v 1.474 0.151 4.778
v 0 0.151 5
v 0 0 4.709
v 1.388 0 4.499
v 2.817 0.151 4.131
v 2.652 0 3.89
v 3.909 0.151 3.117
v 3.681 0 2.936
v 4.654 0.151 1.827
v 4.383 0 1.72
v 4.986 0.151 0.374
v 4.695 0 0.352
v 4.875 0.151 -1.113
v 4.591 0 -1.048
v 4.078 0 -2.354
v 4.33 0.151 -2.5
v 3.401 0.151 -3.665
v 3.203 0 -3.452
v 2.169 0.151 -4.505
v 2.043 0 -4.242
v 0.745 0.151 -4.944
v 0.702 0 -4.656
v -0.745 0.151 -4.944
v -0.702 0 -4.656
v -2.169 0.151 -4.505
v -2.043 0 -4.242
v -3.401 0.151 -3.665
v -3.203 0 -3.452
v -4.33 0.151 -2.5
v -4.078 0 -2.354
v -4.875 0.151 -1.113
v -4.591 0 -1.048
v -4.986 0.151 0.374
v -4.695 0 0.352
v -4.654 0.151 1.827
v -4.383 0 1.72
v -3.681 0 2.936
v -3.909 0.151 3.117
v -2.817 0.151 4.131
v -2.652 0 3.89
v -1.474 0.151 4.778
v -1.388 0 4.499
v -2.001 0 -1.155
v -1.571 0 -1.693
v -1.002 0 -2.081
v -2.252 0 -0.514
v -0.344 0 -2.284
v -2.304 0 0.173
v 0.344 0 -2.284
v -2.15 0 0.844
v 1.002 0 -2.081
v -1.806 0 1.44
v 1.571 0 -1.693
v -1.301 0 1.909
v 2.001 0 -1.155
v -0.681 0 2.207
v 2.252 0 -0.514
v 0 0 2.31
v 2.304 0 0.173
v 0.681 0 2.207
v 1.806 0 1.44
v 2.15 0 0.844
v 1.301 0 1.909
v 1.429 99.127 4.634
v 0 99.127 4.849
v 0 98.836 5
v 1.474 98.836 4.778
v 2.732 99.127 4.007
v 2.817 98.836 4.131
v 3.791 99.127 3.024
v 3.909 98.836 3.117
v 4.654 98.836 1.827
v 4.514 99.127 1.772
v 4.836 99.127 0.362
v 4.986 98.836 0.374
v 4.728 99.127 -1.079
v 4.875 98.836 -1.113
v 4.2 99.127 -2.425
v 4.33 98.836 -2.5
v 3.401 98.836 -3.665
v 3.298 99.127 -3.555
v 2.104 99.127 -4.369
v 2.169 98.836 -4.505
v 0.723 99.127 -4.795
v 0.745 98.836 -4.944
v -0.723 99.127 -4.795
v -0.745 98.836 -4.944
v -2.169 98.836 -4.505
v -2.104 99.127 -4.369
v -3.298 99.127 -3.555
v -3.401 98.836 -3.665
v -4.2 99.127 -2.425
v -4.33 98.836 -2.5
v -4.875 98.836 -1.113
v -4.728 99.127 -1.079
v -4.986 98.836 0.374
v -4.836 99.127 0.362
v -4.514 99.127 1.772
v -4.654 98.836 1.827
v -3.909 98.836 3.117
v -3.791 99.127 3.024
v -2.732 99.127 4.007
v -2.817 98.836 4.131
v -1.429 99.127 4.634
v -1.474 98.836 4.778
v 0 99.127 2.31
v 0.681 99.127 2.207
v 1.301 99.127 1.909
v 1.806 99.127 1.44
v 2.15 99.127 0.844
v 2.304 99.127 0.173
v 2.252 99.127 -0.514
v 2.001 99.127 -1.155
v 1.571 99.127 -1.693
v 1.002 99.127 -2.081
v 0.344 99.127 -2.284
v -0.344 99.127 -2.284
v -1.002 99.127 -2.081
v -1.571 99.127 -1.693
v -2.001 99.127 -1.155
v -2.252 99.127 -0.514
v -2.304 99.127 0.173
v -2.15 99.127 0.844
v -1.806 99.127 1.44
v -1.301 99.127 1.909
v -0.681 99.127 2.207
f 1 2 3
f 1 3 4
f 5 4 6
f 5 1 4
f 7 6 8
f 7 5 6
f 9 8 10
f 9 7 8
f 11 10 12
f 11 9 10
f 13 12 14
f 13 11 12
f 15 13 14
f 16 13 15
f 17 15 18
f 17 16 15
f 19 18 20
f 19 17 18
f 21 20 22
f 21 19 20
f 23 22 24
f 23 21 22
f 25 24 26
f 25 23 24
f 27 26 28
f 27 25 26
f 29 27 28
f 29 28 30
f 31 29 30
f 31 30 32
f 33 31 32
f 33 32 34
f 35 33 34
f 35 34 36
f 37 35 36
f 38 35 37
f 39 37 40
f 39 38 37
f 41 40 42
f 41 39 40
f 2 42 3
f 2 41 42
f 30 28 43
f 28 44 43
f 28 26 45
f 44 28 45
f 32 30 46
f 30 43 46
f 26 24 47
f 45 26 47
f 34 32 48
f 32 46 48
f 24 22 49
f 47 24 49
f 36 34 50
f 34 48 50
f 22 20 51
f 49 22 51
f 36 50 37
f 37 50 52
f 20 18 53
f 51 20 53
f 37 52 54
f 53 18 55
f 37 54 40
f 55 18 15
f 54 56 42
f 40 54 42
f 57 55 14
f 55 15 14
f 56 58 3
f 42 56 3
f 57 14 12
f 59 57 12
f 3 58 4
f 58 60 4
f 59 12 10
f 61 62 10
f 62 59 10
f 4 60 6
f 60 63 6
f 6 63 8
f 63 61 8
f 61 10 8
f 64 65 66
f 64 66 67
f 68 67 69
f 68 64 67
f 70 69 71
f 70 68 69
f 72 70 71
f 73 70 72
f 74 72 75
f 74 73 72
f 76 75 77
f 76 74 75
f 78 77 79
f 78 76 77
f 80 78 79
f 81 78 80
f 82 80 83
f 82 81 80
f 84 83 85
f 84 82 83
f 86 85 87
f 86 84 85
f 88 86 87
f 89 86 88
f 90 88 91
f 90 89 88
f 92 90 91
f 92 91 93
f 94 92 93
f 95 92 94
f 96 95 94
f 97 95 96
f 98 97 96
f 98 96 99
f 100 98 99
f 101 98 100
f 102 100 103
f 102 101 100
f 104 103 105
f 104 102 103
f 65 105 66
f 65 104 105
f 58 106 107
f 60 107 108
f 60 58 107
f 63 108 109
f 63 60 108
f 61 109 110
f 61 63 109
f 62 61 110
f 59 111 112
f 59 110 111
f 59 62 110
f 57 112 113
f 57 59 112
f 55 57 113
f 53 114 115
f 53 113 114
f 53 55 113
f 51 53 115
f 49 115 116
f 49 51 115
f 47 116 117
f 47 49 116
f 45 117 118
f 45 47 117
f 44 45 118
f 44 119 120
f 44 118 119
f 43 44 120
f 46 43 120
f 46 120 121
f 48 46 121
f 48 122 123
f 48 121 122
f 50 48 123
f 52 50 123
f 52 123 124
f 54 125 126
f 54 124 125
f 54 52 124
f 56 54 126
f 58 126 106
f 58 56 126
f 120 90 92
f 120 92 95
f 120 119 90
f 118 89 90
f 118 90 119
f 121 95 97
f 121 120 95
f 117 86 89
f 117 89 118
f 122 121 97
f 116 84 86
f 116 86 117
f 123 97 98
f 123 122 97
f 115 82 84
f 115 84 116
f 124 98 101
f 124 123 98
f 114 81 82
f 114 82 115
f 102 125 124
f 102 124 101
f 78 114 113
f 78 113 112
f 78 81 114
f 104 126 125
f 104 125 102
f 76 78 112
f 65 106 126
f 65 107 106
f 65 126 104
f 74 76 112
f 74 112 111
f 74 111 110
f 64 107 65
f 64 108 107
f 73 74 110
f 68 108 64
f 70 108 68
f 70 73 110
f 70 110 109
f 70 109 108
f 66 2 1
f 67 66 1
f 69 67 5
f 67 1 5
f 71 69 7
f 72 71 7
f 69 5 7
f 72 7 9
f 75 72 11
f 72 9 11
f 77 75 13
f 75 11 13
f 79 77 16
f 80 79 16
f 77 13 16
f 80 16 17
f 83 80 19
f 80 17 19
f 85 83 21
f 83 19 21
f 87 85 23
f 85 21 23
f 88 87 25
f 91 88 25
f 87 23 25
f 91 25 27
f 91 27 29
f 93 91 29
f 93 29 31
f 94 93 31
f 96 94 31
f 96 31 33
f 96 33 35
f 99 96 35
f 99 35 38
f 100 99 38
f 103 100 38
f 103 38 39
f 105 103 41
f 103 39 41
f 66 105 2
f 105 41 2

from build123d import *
from OCP.BRepFilletAPI import BRepFilletAPI_MakeChamfer

# Parameters (mm, degrees)
SKETCH1_R           = 5
BOSS_EXTRUDE1_DEPTH = 99.12697805
SKETCH2_R           = 2.310056849
CUT_EXTRUDE1_DEPTH  = 100.37885981
CHAMFER1_SIZE       = 0.291338269
CHAMFER1_SIZE2      = 0.150529227


with BuildPart() as part:
    # Sketch1 → Boss-Extrude1 (new body)
    with BuildSketch(Plane(origin=(0, 0, 0), x_dir=(1, 0, 0), z_dir=(0, 1, 0))):
        Circle(SKETCH1_R)
    extrude(amount=BOSS_EXTRUDE1_DEPTH)

    # Sketch2 → Cut-Extrude1 (cut, through all)
    with BuildSketch(Plane(origin=(0, 0, 0), x_dir=(1, 0, 0), z_dir=(0, 1, 0))):
        Circle(SKETCH2_R)
    extrude(amount=CUT_EXTRUDE1_DEPTH, mode=Mode.SUBTRACT)

    # Chamfer1: one chamfer whose edges measure the first distance from different faces: ONE call of the kernel's chamfer builder (chamfer() names one face for all edges)
    chamfer1_edges_1 = [part.edges().sort_by_distance(p)[0] for p in [
        (-5, 99.12697805, 0),
    ]]
    chamfer1_side_1 = [part.faces().sort_by_distance(p)[0] for p in [
        (-5, 49.563489025, 0),
    ]]
    chamfer1_edges_2 = [part.edges().sort_by_distance(p)[0] for p in [
        (-5, 0, 0),
    ]]
    chamfer1_side_2 = [part.faces().sort_by_distance(p)[0] for p in [
        (-4.858578644, 0, 0),
    ]]
    chamfer1 = BRepFilletAPI_MakeChamfer(part.part.solid().wrapped)
    for e in chamfer1_edges_1:
        chamfer1.Add(CHAMFER1_SIZE, CHAMFER1_SIZE2, e.wrapped, chamfer1_side_1[0].wrapped)  # the first distance lies on this face
    for e in chamfer1_edges_2:
        chamfer1.Add(CHAMFER1_SIZE, CHAMFER1_SIZE2, e.wrapped, chamfer1_side_2[0].wrapped)  # the first distance lies on this face
    add(Compound.cast(chamfer1.Shape()), mode=Mode.REPLACE)


solid = part.part
